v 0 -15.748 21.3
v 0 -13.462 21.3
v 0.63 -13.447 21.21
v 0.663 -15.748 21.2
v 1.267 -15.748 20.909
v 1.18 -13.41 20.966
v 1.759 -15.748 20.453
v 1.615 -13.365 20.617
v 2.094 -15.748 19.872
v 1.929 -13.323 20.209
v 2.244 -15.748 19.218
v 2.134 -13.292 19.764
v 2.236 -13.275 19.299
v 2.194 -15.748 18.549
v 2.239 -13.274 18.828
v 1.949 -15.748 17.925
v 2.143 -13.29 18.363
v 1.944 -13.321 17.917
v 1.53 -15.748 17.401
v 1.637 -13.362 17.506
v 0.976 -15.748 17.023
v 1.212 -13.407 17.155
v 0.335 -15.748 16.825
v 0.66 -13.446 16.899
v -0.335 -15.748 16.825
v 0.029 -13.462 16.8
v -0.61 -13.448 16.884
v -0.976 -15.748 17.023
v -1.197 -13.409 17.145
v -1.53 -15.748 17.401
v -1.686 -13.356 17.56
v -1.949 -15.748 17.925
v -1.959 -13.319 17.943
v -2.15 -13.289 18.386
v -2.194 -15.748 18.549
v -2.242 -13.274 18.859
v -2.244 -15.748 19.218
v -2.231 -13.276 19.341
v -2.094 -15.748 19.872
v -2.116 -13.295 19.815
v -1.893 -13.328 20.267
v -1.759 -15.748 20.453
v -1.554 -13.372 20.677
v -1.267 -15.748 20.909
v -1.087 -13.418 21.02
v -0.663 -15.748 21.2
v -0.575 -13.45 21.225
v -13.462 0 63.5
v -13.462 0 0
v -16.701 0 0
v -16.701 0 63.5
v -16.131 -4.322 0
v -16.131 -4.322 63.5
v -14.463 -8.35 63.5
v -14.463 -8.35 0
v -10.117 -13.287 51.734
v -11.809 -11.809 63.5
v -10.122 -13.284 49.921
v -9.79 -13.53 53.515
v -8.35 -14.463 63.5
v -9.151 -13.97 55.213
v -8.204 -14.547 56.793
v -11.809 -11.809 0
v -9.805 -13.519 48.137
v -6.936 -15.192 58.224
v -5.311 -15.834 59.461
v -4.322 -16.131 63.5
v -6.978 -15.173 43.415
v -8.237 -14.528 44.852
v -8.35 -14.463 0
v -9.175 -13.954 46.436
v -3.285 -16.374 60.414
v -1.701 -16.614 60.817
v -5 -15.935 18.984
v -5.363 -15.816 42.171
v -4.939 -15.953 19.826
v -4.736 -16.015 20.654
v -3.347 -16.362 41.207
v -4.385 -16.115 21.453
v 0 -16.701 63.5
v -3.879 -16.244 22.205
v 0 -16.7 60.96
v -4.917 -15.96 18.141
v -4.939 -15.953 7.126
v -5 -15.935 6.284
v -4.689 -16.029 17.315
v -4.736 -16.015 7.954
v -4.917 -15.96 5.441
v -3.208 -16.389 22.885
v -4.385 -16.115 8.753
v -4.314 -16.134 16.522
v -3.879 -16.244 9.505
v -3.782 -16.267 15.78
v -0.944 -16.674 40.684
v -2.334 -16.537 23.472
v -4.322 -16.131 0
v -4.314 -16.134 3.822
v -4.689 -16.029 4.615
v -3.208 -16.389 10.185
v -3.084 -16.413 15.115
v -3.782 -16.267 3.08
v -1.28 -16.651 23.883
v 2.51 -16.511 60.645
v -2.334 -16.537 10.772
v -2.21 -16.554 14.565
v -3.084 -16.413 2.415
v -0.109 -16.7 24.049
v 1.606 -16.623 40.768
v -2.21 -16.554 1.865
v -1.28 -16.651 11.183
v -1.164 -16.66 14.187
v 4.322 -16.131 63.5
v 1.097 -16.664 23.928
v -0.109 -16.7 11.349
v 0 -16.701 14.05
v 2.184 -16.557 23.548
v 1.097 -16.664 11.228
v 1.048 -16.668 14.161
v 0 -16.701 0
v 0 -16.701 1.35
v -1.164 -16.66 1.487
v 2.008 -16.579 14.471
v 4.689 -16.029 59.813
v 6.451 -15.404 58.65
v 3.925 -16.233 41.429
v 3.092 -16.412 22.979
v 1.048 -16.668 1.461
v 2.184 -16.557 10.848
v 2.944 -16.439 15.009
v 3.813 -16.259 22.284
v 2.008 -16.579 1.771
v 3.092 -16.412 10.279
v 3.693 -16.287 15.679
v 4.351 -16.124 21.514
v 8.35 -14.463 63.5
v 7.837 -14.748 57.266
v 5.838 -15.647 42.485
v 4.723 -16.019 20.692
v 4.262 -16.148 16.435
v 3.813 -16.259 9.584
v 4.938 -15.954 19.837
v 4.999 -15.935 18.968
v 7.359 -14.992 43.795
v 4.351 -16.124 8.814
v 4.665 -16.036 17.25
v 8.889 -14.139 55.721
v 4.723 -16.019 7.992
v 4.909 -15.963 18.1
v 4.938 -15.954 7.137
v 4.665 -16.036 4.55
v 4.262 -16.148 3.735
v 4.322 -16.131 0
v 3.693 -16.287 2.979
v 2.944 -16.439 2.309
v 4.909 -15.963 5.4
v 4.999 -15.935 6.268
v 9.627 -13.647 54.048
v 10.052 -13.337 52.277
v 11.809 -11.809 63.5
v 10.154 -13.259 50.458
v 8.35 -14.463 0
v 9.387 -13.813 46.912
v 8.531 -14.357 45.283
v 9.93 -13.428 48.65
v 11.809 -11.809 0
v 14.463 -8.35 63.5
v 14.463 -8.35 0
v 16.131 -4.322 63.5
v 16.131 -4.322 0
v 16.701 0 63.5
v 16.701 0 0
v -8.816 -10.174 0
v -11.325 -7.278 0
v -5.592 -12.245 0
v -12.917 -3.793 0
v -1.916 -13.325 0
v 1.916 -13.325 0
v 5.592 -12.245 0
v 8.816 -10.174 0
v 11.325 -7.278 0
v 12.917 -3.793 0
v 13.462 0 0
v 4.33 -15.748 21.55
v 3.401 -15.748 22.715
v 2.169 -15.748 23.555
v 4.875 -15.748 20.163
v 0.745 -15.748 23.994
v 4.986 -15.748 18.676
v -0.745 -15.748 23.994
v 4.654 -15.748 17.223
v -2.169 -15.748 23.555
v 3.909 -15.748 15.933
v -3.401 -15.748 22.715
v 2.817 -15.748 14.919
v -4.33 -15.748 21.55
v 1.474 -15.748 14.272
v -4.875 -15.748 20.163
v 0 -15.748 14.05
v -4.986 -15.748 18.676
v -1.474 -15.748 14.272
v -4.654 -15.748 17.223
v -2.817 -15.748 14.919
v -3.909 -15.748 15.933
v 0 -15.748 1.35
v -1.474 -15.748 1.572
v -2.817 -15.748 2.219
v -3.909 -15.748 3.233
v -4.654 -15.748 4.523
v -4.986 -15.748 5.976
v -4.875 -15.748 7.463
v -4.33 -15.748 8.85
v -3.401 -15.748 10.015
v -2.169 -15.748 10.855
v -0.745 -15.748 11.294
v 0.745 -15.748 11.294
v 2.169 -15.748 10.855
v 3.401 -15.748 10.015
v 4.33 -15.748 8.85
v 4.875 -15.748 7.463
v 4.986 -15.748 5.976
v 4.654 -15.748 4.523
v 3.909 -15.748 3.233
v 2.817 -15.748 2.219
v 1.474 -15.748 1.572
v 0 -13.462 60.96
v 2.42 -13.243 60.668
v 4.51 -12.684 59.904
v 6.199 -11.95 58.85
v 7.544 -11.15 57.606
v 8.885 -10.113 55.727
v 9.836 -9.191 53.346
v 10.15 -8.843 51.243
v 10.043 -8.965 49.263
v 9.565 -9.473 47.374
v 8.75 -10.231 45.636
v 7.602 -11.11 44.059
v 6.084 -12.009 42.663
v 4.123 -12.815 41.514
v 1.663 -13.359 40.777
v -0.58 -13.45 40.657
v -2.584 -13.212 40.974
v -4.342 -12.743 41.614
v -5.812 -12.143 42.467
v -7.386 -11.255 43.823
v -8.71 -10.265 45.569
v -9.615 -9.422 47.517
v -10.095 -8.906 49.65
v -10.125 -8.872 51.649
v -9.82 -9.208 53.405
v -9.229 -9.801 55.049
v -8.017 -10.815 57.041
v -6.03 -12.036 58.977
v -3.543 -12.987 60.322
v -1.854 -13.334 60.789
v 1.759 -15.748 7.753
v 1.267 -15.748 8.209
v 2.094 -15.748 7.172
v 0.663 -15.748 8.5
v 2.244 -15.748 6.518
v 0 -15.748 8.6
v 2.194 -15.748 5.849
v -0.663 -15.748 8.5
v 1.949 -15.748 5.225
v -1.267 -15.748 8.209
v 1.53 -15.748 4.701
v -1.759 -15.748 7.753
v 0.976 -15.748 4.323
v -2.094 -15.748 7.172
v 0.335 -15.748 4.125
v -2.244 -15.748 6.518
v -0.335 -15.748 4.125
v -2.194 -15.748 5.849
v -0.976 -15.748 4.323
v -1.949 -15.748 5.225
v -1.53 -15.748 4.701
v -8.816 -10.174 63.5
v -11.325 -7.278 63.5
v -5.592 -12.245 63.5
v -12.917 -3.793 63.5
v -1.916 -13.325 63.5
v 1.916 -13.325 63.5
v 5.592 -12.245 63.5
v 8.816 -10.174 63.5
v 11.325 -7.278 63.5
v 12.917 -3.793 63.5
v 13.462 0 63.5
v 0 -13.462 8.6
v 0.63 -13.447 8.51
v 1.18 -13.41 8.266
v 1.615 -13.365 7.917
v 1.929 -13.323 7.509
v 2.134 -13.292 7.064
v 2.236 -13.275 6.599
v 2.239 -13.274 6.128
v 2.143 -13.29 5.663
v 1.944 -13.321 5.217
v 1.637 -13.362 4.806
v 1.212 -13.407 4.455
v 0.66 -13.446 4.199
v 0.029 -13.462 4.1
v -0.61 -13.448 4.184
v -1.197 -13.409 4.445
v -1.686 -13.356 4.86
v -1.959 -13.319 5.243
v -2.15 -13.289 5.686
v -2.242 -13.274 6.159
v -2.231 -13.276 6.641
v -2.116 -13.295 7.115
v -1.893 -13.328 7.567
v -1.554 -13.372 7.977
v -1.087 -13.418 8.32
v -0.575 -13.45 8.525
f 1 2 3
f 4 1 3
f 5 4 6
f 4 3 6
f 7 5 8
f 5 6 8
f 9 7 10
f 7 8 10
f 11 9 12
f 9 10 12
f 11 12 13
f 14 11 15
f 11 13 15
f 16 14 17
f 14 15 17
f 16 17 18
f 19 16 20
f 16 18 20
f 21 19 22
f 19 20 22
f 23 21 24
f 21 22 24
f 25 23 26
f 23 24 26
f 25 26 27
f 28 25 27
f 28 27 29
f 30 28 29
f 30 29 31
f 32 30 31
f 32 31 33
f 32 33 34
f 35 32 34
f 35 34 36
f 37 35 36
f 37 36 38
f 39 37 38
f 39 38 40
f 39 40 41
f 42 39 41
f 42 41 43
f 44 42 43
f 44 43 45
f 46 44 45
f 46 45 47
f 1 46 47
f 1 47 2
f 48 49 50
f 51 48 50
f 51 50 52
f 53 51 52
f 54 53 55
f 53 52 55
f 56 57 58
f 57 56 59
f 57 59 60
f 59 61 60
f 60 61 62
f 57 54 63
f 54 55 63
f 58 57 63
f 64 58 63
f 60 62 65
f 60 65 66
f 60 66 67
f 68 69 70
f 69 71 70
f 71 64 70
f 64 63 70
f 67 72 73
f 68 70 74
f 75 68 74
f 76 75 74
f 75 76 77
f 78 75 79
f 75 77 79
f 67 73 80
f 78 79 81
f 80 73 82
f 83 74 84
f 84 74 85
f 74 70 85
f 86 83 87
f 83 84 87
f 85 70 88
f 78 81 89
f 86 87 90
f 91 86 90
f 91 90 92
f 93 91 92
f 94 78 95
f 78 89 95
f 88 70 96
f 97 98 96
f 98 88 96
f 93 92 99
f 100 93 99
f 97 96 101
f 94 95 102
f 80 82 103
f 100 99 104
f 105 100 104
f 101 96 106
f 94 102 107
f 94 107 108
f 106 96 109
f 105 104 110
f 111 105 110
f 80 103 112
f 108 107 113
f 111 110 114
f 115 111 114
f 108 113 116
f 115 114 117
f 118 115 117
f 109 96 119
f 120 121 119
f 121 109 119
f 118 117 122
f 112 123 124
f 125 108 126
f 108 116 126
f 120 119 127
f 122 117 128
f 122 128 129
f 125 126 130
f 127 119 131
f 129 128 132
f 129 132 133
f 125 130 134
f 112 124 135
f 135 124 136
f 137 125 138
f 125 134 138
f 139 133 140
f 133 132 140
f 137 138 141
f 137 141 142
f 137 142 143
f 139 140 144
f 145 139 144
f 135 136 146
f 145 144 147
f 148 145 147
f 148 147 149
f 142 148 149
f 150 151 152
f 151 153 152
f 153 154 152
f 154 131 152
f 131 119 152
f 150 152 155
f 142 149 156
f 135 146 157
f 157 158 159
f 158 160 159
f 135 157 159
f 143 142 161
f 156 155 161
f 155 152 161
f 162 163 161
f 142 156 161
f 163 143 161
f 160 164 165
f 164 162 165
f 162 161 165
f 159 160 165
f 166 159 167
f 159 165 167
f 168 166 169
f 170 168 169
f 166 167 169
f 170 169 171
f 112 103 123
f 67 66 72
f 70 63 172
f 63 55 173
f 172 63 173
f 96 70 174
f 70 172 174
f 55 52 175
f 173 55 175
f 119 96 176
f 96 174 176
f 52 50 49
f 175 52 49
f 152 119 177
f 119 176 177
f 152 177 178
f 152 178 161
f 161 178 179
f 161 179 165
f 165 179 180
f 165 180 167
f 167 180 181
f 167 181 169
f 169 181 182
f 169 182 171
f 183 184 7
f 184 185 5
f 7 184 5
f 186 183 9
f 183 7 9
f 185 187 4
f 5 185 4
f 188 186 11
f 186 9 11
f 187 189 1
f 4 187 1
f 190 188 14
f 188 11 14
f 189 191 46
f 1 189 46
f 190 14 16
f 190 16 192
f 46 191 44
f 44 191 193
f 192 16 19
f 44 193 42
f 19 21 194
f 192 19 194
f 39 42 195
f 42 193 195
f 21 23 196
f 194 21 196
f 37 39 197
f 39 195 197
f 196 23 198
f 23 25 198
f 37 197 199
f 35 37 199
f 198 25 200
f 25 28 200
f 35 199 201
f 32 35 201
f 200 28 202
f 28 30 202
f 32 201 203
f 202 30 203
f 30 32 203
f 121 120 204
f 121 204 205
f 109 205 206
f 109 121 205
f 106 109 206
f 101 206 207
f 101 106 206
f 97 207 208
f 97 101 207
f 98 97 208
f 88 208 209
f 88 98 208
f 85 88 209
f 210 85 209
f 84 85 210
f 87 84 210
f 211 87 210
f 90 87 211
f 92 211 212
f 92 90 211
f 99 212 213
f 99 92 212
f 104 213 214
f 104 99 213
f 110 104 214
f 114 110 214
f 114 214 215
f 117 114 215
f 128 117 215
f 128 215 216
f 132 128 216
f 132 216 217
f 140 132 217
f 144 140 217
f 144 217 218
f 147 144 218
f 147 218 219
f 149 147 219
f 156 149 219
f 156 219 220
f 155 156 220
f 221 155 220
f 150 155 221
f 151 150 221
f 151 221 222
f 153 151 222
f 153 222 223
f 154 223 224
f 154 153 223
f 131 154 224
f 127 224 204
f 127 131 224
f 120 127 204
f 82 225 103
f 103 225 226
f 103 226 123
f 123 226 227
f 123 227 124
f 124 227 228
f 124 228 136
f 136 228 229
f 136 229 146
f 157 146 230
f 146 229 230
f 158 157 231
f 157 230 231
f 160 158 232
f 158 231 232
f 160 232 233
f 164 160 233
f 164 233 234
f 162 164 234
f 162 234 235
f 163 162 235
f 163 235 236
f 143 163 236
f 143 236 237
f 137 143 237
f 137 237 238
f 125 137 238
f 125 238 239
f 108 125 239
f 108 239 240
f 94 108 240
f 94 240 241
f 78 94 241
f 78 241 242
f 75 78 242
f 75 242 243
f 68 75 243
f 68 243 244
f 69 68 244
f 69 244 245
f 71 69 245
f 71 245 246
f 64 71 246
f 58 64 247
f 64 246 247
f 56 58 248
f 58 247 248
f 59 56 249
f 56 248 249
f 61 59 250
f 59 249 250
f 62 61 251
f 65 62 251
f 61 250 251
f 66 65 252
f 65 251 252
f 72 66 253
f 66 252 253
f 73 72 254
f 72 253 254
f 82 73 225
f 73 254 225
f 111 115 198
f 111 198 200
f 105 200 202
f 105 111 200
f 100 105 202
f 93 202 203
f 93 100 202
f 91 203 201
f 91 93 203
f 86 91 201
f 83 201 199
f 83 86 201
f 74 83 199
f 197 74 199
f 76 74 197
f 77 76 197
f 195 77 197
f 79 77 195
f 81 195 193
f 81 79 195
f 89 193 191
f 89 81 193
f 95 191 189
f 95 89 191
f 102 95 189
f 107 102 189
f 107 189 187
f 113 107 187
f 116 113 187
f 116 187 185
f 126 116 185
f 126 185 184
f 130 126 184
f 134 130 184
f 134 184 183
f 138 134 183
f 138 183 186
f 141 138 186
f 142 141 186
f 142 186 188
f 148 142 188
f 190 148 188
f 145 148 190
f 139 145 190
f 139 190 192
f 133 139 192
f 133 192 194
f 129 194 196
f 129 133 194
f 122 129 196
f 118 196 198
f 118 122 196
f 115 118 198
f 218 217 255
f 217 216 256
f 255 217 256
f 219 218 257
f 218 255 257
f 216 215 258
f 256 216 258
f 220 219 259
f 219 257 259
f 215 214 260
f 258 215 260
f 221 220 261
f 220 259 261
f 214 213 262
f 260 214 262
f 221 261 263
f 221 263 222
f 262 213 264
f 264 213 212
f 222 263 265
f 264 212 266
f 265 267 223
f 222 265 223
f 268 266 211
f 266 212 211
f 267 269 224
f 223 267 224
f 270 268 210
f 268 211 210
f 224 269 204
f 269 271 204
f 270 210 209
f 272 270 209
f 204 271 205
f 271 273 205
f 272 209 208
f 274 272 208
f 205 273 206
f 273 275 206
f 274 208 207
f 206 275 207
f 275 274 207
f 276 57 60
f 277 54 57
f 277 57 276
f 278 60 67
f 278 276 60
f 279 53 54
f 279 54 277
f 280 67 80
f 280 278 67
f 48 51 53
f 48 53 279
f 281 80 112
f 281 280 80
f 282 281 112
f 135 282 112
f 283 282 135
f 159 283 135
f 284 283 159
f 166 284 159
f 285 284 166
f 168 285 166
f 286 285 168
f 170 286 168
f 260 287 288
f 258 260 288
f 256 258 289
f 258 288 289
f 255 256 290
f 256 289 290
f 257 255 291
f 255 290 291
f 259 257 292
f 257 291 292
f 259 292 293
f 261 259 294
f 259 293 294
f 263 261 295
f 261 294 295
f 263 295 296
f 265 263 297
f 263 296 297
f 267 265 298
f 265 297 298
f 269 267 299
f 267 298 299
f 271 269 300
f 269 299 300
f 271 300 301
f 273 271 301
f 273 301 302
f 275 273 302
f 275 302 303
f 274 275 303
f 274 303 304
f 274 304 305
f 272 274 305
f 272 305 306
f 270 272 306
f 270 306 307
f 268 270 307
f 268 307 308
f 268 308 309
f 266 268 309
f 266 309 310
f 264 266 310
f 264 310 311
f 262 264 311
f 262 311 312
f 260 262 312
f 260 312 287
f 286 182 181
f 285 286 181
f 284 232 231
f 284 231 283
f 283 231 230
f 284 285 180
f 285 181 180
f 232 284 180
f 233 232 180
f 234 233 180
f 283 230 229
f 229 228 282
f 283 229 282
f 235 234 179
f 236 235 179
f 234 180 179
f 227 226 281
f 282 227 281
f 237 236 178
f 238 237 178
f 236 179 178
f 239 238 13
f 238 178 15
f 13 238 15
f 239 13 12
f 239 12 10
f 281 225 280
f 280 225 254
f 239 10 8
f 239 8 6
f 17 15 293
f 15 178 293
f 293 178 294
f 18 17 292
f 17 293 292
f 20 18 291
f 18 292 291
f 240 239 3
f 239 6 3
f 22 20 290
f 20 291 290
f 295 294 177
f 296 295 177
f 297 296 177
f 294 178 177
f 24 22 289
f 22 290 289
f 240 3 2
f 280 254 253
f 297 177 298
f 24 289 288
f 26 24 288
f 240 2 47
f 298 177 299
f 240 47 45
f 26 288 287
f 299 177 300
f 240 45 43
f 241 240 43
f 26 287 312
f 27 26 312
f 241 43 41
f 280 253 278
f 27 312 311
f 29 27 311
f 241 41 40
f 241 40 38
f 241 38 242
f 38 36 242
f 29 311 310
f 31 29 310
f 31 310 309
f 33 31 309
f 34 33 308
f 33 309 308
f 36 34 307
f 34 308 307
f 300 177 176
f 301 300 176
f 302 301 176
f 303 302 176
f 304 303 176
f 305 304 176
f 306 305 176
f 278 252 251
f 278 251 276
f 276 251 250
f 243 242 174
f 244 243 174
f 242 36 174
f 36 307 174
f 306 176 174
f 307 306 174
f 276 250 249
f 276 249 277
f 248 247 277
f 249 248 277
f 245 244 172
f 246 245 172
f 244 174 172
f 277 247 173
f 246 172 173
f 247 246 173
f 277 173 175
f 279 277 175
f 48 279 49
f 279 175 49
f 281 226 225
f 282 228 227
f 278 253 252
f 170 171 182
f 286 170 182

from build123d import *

# Parameters (mm, degrees)
BOSS_EXTRUDE1_DEPTH     = 63.5
CUT_EXTRUDE1_REACH      = 69.75
CUT_EXTRUDE1_END_RADIUS = 16.7005
SKETCH2_R               = 10.16
CUT_EXTRUDE2_REACH      = 69.75
CUT_EXTRUDE2_END_RADIUS = 16.7005
SKETCH5_R               = 2.25
SKETCH8_R               = 5
CUT_EXTRUDE4_DEPTH      = 2.032


with BuildPart() as part:
    # Sketch1 → Boss-Extrude1 (new body)
    with BuildSketch(Plane.XY):
        with BuildLine():
            ThreePointArc((13.462, 0), (0, -13.462), (-13.462, 0))
            Line((-13.462, 0), (-16.7005, 0))
            ThreePointArc((-16.7005, 0), (0, -16.7005), (16.7005, 0))
            Line((16.7005, 0), (13.462, 0))
        make_face()
    extrude(amount=BOSS_EXTRUDE1_DEPTH)

    # Cut-Extrude1: up to this cylinder (the profile starts inside it)
    cut_extrude1_end = Plane(origin=(0, 0, 50.8), z_dir=(0, 0, -1)) * Cylinder(CUT_EXTRUDE1_END_RADIUS, 173.901, mode=Mode.PRIVATE)
    # Sketch2 → Cut-Extrude1 (cut, up to the surface)
    with BuildSketch(Plane(origin=(0, 0, 0), x_dir=(1, 0, 0), z_dir=(0, 1, 0)), mode=Mode.PRIVATE) as cut_extrude1_sk1:
        with Locations(Location((0, -50.8, 0), (0, 0, 270))):
            Circle(SKETCH2_R)
    cut_extrude1_tool1 = extrude(cut_extrude1_sk1.sketch, amount=-CUT_EXTRUDE1_REACH, mode=Mode.PRIVATE) & cut_extrude1_end
    add(cut_extrude1_tool1.solids().sort_by_distance((0, 0, 50.8))[0], mode=Mode.SUBTRACT)

    # Cut-Extrude2: up to this cylinder (the profile starts inside it)
    cut_extrude2_end = Plane(origin=(0, 0, 12.7), z_dir=(0, 0, -1)) * Cylinder(CUT_EXTRUDE2_END_RADIUS, 186.601, mode=Mode.PRIVATE)
    # Sketch5 → Cut-Extrude2 (cut, up to the surface)
    with BuildSketch(Plane(origin=(0, 0, 0), x_dir=(1, 0, 0), z_dir=(0, 1, 0)), mode=Mode.PRIVATE) as cut_extrude2_sk1:
        with Locations(Location((0, -6.35, 0), (0, 0, 270))):
            Circle(SKETCH5_R)
    cut_extrude2_tool1 = extrude(cut_extrude2_sk1.sketch, amount=-CUT_EXTRUDE2_REACH, mode=Mode.PRIVATE) & cut_extrude2_end
    add(cut_extrude2_tool1.solids().sort_by_distance((0, 0, 6.35))[0], mode=Mode.SUBTRACT)
    # Sketch5 → Cut-Extrude2 (cut, up to the surface)
    with BuildSketch(Plane(origin=(0, 0, 0), x_dir=(1, 0, 0), z_dir=(0, 1, 0)), mode=Mode.PRIVATE) as cut_extrude2_sk2:
        with Locations(Location((0, -19.05, 0), (0, 0, 270))):
            Circle(SKETCH5_R)
    cut_extrude2_tool2 = extrude(cut_extrude2_sk2.sketch, amount=-CUT_EXTRUDE2_REACH, mode=Mode.PRIVATE) & cut_extrude2_end
    add(cut_extrude2_tool2.solids().sort_by_distance((0, 0, 19.05))[0], mode=Mode.SUBTRACT)

    # Sketch8 → Cut-Extrude4 (cut)
    with BuildSketch(Plane(origin=(0, -17.78, 0), x_dir=(1, 0, 0), z_dir=(0, 1, 0))):
        with Locations(Location((0, -6.35, 0), (0, 0, 90))):
            Circle(SKETCH8_R)
        with Locations(Location((0, -19.05, 0), (0, 0, 90))):
            Circle(SKETCH8_R)
    extrude(amount=CUT_EXTRUDE4_DEPTH, mode=Mode.SUBTRACT)


solid = part.part
